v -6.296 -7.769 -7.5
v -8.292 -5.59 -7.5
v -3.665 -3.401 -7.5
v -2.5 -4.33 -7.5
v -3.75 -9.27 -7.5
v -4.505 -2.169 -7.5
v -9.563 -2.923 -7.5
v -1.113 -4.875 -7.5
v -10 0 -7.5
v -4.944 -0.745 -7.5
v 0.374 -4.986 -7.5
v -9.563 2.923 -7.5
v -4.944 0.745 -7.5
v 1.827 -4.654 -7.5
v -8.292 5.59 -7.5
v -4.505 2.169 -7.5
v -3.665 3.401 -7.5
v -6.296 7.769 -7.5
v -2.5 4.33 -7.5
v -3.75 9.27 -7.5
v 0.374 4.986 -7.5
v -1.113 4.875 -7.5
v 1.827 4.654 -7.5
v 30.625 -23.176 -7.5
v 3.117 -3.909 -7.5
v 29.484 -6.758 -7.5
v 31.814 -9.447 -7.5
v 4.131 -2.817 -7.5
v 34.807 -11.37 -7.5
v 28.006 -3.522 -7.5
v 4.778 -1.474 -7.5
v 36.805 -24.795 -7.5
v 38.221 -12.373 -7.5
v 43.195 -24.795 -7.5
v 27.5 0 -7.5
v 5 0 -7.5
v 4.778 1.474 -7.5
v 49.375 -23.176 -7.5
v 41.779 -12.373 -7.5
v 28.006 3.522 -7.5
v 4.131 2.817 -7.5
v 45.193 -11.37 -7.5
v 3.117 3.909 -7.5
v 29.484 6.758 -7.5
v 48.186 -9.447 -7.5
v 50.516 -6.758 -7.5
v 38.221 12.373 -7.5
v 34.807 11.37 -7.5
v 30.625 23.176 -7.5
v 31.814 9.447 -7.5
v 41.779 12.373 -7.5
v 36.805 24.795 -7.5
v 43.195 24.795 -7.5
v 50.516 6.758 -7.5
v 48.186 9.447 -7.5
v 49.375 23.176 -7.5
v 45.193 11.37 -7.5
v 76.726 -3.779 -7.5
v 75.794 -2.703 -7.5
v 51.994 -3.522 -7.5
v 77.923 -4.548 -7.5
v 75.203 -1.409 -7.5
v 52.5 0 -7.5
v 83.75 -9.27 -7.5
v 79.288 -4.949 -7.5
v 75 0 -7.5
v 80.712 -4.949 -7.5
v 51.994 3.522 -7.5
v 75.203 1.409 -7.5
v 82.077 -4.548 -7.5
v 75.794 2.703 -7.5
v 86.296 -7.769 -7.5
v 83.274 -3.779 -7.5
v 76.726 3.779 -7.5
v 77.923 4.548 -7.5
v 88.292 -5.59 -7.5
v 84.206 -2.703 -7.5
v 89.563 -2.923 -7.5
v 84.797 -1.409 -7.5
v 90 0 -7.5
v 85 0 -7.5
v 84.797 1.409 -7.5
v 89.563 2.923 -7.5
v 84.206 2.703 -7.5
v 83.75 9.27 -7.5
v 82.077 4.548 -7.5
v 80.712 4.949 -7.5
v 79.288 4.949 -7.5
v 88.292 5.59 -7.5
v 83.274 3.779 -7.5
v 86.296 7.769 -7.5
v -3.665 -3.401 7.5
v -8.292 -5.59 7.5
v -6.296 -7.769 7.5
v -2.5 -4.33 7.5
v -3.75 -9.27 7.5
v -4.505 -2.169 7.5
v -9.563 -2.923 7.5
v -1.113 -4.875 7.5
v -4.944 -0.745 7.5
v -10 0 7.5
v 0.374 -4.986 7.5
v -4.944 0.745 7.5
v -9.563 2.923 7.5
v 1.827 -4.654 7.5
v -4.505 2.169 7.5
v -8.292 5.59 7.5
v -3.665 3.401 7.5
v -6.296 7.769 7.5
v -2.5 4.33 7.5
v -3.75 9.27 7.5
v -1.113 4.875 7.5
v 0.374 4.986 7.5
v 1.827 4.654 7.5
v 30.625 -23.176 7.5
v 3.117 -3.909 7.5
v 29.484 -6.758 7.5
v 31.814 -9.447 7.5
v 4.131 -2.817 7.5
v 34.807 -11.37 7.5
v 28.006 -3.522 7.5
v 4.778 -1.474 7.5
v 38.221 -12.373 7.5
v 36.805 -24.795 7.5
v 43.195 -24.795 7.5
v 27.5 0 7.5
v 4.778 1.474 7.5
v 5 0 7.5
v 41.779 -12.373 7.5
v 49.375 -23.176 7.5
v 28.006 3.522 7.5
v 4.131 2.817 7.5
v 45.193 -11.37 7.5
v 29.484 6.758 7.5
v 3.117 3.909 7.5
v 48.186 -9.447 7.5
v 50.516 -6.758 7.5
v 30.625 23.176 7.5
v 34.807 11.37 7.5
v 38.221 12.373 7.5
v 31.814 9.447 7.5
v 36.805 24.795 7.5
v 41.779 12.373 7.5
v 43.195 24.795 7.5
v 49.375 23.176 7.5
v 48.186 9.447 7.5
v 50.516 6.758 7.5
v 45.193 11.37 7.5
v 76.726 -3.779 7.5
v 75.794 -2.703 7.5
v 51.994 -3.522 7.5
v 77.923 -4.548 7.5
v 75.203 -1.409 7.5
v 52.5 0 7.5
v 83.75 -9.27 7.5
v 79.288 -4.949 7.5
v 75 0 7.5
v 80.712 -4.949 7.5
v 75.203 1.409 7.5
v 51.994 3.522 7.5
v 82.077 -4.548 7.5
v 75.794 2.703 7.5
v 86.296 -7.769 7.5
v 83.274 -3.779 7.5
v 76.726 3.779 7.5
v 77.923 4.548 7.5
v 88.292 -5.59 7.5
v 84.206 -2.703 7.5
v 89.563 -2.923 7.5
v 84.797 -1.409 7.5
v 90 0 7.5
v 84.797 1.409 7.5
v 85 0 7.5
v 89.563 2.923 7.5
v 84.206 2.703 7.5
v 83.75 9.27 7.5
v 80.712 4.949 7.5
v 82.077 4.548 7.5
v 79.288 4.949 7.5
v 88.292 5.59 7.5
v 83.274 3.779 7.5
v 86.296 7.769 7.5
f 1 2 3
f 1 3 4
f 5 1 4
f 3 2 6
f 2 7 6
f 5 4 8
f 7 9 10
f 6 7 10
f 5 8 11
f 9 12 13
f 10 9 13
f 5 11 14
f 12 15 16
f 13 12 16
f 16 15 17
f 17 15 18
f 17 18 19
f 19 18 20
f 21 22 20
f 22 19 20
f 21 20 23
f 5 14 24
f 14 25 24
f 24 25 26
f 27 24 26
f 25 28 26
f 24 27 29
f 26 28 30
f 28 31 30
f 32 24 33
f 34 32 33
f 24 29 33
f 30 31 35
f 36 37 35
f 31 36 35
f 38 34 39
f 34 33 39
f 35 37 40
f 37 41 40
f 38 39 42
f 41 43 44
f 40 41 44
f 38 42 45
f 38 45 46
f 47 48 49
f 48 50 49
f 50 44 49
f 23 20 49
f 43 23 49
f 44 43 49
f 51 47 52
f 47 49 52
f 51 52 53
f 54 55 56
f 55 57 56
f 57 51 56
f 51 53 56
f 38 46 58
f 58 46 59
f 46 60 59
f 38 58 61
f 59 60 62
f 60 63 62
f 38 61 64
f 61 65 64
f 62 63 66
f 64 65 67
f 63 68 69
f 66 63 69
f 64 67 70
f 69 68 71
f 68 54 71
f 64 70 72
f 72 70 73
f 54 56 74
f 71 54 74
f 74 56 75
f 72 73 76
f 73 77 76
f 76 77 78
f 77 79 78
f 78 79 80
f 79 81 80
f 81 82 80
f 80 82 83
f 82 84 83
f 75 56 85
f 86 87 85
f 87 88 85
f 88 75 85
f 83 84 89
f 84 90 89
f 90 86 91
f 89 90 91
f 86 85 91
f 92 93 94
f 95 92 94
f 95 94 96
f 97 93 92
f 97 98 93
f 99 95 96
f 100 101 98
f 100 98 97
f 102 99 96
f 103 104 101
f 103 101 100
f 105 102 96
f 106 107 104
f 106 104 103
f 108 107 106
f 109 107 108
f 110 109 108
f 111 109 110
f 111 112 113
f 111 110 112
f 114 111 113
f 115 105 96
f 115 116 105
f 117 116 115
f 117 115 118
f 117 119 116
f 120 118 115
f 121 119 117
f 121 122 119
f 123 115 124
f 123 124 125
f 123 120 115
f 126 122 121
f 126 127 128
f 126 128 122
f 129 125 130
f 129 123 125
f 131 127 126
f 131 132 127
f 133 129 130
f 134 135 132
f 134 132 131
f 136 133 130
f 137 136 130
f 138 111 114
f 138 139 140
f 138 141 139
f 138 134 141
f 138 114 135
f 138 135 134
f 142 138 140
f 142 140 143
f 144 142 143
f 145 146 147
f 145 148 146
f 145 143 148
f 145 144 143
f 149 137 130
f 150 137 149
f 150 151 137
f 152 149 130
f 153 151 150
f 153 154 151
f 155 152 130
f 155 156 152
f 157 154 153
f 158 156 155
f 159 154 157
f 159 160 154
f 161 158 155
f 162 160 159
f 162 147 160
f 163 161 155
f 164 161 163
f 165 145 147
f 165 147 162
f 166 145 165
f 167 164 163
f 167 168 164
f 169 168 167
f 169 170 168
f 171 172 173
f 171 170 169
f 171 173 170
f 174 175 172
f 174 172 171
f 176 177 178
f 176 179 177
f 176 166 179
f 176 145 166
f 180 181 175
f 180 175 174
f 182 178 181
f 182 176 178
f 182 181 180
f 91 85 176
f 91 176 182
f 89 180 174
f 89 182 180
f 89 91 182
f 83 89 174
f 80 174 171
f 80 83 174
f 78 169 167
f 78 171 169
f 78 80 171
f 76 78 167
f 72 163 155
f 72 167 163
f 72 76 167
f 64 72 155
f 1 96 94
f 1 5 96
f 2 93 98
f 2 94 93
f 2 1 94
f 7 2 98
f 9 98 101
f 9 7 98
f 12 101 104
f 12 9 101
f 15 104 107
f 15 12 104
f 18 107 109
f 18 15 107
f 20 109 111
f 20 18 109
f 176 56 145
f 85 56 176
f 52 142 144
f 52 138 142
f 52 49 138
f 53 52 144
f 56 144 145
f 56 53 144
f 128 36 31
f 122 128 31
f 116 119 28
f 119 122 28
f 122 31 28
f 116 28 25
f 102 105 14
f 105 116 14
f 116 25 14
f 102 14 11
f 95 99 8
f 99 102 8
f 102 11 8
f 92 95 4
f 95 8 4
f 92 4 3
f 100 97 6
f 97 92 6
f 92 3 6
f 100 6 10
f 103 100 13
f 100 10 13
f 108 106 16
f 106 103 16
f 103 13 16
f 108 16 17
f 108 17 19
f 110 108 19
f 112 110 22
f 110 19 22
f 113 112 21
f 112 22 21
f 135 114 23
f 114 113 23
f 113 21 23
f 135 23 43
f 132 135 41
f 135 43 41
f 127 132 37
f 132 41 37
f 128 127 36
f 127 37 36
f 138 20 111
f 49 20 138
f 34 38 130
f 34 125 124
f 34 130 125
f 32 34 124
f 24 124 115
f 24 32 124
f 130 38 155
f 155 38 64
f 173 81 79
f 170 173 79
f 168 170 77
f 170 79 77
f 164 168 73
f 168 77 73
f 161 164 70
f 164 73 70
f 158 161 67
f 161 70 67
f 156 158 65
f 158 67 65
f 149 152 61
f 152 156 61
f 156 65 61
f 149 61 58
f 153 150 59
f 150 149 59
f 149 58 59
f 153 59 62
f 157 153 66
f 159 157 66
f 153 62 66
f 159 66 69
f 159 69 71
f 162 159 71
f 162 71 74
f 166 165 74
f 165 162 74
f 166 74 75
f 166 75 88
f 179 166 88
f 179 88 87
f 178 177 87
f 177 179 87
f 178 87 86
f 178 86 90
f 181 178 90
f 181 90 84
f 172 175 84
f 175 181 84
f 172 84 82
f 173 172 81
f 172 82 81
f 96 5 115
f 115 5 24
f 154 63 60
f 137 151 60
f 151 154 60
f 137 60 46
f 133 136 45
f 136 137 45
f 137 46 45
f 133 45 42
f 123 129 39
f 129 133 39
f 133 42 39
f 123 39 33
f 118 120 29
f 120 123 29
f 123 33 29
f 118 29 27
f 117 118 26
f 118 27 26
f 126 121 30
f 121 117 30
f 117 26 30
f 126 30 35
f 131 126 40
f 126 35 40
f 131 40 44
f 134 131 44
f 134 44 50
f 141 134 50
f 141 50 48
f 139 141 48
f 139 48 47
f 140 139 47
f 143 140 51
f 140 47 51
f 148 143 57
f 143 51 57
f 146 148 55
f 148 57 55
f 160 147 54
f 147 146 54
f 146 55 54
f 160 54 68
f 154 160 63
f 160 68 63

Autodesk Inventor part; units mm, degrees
ref_plane "YZ Plane" through (0, 0, 0) normal (1, 0, 0) x (0, 1, 0)
ref_plane "XZ Plane" through (0, 0, 0) normal (0, 1, 0) x (-1, 0, 0)
ref_plane "XY Plane" through (0, 0, 0) normal (0, 0, 1) x (1, 0, 0)
sketch "Sketch1" plane through (0, 0, 0) normal (0, 0, 1) x (1, 0, 0)
  line L0 (0, 0) -> (80, 0)
  circle A0 centre (0, 0) radius 5
  arc A1 (-3.75, 9.2702) -> (-3.75, -9.2702) centre (0, 0) ccw
  circle A2 centre (80, 0) radius 5
  arc A3 (83.75, -9.2702) -> (83.75, 9.2702) centre (80, 0) ccw
  circle A4 centre (40, 0) radius 12.5
  line L1 (-3.75, 9.2702) -> (30.625, 23.1756)
  line L2 (-3.75, -9.2702) -> (30.625, -23.1756)
  line L3 (49.375, -23.1756) -> (83.75, -9.2702)
  line L4 (106.6667, 0) -> (111.5084, 1.9586)
  line L5 (49.375, 23.1756) -> (83.75, 9.2702)
  line L6 (106.6667, 0) -> (112.4269, -2.3301)
  arc A5 (30.625, -23.1756) -> (49.375, -23.1756) centre (40, 0) ccw
  arc A6 (49.375, 23.1756) -> (30.625, 23.1756) centre (40, 0) ccw
  dimension "d0" = 80
  dimension "d1" = 20
  dimension "d2" = 10
  dimension "d4" = 25
  dimension "d5" = 20
  dimension "d6" = 10
  dimension "d7" = 40
extrude "Extrusion1" add sketch "Sketch1" along normal mid plane 15
